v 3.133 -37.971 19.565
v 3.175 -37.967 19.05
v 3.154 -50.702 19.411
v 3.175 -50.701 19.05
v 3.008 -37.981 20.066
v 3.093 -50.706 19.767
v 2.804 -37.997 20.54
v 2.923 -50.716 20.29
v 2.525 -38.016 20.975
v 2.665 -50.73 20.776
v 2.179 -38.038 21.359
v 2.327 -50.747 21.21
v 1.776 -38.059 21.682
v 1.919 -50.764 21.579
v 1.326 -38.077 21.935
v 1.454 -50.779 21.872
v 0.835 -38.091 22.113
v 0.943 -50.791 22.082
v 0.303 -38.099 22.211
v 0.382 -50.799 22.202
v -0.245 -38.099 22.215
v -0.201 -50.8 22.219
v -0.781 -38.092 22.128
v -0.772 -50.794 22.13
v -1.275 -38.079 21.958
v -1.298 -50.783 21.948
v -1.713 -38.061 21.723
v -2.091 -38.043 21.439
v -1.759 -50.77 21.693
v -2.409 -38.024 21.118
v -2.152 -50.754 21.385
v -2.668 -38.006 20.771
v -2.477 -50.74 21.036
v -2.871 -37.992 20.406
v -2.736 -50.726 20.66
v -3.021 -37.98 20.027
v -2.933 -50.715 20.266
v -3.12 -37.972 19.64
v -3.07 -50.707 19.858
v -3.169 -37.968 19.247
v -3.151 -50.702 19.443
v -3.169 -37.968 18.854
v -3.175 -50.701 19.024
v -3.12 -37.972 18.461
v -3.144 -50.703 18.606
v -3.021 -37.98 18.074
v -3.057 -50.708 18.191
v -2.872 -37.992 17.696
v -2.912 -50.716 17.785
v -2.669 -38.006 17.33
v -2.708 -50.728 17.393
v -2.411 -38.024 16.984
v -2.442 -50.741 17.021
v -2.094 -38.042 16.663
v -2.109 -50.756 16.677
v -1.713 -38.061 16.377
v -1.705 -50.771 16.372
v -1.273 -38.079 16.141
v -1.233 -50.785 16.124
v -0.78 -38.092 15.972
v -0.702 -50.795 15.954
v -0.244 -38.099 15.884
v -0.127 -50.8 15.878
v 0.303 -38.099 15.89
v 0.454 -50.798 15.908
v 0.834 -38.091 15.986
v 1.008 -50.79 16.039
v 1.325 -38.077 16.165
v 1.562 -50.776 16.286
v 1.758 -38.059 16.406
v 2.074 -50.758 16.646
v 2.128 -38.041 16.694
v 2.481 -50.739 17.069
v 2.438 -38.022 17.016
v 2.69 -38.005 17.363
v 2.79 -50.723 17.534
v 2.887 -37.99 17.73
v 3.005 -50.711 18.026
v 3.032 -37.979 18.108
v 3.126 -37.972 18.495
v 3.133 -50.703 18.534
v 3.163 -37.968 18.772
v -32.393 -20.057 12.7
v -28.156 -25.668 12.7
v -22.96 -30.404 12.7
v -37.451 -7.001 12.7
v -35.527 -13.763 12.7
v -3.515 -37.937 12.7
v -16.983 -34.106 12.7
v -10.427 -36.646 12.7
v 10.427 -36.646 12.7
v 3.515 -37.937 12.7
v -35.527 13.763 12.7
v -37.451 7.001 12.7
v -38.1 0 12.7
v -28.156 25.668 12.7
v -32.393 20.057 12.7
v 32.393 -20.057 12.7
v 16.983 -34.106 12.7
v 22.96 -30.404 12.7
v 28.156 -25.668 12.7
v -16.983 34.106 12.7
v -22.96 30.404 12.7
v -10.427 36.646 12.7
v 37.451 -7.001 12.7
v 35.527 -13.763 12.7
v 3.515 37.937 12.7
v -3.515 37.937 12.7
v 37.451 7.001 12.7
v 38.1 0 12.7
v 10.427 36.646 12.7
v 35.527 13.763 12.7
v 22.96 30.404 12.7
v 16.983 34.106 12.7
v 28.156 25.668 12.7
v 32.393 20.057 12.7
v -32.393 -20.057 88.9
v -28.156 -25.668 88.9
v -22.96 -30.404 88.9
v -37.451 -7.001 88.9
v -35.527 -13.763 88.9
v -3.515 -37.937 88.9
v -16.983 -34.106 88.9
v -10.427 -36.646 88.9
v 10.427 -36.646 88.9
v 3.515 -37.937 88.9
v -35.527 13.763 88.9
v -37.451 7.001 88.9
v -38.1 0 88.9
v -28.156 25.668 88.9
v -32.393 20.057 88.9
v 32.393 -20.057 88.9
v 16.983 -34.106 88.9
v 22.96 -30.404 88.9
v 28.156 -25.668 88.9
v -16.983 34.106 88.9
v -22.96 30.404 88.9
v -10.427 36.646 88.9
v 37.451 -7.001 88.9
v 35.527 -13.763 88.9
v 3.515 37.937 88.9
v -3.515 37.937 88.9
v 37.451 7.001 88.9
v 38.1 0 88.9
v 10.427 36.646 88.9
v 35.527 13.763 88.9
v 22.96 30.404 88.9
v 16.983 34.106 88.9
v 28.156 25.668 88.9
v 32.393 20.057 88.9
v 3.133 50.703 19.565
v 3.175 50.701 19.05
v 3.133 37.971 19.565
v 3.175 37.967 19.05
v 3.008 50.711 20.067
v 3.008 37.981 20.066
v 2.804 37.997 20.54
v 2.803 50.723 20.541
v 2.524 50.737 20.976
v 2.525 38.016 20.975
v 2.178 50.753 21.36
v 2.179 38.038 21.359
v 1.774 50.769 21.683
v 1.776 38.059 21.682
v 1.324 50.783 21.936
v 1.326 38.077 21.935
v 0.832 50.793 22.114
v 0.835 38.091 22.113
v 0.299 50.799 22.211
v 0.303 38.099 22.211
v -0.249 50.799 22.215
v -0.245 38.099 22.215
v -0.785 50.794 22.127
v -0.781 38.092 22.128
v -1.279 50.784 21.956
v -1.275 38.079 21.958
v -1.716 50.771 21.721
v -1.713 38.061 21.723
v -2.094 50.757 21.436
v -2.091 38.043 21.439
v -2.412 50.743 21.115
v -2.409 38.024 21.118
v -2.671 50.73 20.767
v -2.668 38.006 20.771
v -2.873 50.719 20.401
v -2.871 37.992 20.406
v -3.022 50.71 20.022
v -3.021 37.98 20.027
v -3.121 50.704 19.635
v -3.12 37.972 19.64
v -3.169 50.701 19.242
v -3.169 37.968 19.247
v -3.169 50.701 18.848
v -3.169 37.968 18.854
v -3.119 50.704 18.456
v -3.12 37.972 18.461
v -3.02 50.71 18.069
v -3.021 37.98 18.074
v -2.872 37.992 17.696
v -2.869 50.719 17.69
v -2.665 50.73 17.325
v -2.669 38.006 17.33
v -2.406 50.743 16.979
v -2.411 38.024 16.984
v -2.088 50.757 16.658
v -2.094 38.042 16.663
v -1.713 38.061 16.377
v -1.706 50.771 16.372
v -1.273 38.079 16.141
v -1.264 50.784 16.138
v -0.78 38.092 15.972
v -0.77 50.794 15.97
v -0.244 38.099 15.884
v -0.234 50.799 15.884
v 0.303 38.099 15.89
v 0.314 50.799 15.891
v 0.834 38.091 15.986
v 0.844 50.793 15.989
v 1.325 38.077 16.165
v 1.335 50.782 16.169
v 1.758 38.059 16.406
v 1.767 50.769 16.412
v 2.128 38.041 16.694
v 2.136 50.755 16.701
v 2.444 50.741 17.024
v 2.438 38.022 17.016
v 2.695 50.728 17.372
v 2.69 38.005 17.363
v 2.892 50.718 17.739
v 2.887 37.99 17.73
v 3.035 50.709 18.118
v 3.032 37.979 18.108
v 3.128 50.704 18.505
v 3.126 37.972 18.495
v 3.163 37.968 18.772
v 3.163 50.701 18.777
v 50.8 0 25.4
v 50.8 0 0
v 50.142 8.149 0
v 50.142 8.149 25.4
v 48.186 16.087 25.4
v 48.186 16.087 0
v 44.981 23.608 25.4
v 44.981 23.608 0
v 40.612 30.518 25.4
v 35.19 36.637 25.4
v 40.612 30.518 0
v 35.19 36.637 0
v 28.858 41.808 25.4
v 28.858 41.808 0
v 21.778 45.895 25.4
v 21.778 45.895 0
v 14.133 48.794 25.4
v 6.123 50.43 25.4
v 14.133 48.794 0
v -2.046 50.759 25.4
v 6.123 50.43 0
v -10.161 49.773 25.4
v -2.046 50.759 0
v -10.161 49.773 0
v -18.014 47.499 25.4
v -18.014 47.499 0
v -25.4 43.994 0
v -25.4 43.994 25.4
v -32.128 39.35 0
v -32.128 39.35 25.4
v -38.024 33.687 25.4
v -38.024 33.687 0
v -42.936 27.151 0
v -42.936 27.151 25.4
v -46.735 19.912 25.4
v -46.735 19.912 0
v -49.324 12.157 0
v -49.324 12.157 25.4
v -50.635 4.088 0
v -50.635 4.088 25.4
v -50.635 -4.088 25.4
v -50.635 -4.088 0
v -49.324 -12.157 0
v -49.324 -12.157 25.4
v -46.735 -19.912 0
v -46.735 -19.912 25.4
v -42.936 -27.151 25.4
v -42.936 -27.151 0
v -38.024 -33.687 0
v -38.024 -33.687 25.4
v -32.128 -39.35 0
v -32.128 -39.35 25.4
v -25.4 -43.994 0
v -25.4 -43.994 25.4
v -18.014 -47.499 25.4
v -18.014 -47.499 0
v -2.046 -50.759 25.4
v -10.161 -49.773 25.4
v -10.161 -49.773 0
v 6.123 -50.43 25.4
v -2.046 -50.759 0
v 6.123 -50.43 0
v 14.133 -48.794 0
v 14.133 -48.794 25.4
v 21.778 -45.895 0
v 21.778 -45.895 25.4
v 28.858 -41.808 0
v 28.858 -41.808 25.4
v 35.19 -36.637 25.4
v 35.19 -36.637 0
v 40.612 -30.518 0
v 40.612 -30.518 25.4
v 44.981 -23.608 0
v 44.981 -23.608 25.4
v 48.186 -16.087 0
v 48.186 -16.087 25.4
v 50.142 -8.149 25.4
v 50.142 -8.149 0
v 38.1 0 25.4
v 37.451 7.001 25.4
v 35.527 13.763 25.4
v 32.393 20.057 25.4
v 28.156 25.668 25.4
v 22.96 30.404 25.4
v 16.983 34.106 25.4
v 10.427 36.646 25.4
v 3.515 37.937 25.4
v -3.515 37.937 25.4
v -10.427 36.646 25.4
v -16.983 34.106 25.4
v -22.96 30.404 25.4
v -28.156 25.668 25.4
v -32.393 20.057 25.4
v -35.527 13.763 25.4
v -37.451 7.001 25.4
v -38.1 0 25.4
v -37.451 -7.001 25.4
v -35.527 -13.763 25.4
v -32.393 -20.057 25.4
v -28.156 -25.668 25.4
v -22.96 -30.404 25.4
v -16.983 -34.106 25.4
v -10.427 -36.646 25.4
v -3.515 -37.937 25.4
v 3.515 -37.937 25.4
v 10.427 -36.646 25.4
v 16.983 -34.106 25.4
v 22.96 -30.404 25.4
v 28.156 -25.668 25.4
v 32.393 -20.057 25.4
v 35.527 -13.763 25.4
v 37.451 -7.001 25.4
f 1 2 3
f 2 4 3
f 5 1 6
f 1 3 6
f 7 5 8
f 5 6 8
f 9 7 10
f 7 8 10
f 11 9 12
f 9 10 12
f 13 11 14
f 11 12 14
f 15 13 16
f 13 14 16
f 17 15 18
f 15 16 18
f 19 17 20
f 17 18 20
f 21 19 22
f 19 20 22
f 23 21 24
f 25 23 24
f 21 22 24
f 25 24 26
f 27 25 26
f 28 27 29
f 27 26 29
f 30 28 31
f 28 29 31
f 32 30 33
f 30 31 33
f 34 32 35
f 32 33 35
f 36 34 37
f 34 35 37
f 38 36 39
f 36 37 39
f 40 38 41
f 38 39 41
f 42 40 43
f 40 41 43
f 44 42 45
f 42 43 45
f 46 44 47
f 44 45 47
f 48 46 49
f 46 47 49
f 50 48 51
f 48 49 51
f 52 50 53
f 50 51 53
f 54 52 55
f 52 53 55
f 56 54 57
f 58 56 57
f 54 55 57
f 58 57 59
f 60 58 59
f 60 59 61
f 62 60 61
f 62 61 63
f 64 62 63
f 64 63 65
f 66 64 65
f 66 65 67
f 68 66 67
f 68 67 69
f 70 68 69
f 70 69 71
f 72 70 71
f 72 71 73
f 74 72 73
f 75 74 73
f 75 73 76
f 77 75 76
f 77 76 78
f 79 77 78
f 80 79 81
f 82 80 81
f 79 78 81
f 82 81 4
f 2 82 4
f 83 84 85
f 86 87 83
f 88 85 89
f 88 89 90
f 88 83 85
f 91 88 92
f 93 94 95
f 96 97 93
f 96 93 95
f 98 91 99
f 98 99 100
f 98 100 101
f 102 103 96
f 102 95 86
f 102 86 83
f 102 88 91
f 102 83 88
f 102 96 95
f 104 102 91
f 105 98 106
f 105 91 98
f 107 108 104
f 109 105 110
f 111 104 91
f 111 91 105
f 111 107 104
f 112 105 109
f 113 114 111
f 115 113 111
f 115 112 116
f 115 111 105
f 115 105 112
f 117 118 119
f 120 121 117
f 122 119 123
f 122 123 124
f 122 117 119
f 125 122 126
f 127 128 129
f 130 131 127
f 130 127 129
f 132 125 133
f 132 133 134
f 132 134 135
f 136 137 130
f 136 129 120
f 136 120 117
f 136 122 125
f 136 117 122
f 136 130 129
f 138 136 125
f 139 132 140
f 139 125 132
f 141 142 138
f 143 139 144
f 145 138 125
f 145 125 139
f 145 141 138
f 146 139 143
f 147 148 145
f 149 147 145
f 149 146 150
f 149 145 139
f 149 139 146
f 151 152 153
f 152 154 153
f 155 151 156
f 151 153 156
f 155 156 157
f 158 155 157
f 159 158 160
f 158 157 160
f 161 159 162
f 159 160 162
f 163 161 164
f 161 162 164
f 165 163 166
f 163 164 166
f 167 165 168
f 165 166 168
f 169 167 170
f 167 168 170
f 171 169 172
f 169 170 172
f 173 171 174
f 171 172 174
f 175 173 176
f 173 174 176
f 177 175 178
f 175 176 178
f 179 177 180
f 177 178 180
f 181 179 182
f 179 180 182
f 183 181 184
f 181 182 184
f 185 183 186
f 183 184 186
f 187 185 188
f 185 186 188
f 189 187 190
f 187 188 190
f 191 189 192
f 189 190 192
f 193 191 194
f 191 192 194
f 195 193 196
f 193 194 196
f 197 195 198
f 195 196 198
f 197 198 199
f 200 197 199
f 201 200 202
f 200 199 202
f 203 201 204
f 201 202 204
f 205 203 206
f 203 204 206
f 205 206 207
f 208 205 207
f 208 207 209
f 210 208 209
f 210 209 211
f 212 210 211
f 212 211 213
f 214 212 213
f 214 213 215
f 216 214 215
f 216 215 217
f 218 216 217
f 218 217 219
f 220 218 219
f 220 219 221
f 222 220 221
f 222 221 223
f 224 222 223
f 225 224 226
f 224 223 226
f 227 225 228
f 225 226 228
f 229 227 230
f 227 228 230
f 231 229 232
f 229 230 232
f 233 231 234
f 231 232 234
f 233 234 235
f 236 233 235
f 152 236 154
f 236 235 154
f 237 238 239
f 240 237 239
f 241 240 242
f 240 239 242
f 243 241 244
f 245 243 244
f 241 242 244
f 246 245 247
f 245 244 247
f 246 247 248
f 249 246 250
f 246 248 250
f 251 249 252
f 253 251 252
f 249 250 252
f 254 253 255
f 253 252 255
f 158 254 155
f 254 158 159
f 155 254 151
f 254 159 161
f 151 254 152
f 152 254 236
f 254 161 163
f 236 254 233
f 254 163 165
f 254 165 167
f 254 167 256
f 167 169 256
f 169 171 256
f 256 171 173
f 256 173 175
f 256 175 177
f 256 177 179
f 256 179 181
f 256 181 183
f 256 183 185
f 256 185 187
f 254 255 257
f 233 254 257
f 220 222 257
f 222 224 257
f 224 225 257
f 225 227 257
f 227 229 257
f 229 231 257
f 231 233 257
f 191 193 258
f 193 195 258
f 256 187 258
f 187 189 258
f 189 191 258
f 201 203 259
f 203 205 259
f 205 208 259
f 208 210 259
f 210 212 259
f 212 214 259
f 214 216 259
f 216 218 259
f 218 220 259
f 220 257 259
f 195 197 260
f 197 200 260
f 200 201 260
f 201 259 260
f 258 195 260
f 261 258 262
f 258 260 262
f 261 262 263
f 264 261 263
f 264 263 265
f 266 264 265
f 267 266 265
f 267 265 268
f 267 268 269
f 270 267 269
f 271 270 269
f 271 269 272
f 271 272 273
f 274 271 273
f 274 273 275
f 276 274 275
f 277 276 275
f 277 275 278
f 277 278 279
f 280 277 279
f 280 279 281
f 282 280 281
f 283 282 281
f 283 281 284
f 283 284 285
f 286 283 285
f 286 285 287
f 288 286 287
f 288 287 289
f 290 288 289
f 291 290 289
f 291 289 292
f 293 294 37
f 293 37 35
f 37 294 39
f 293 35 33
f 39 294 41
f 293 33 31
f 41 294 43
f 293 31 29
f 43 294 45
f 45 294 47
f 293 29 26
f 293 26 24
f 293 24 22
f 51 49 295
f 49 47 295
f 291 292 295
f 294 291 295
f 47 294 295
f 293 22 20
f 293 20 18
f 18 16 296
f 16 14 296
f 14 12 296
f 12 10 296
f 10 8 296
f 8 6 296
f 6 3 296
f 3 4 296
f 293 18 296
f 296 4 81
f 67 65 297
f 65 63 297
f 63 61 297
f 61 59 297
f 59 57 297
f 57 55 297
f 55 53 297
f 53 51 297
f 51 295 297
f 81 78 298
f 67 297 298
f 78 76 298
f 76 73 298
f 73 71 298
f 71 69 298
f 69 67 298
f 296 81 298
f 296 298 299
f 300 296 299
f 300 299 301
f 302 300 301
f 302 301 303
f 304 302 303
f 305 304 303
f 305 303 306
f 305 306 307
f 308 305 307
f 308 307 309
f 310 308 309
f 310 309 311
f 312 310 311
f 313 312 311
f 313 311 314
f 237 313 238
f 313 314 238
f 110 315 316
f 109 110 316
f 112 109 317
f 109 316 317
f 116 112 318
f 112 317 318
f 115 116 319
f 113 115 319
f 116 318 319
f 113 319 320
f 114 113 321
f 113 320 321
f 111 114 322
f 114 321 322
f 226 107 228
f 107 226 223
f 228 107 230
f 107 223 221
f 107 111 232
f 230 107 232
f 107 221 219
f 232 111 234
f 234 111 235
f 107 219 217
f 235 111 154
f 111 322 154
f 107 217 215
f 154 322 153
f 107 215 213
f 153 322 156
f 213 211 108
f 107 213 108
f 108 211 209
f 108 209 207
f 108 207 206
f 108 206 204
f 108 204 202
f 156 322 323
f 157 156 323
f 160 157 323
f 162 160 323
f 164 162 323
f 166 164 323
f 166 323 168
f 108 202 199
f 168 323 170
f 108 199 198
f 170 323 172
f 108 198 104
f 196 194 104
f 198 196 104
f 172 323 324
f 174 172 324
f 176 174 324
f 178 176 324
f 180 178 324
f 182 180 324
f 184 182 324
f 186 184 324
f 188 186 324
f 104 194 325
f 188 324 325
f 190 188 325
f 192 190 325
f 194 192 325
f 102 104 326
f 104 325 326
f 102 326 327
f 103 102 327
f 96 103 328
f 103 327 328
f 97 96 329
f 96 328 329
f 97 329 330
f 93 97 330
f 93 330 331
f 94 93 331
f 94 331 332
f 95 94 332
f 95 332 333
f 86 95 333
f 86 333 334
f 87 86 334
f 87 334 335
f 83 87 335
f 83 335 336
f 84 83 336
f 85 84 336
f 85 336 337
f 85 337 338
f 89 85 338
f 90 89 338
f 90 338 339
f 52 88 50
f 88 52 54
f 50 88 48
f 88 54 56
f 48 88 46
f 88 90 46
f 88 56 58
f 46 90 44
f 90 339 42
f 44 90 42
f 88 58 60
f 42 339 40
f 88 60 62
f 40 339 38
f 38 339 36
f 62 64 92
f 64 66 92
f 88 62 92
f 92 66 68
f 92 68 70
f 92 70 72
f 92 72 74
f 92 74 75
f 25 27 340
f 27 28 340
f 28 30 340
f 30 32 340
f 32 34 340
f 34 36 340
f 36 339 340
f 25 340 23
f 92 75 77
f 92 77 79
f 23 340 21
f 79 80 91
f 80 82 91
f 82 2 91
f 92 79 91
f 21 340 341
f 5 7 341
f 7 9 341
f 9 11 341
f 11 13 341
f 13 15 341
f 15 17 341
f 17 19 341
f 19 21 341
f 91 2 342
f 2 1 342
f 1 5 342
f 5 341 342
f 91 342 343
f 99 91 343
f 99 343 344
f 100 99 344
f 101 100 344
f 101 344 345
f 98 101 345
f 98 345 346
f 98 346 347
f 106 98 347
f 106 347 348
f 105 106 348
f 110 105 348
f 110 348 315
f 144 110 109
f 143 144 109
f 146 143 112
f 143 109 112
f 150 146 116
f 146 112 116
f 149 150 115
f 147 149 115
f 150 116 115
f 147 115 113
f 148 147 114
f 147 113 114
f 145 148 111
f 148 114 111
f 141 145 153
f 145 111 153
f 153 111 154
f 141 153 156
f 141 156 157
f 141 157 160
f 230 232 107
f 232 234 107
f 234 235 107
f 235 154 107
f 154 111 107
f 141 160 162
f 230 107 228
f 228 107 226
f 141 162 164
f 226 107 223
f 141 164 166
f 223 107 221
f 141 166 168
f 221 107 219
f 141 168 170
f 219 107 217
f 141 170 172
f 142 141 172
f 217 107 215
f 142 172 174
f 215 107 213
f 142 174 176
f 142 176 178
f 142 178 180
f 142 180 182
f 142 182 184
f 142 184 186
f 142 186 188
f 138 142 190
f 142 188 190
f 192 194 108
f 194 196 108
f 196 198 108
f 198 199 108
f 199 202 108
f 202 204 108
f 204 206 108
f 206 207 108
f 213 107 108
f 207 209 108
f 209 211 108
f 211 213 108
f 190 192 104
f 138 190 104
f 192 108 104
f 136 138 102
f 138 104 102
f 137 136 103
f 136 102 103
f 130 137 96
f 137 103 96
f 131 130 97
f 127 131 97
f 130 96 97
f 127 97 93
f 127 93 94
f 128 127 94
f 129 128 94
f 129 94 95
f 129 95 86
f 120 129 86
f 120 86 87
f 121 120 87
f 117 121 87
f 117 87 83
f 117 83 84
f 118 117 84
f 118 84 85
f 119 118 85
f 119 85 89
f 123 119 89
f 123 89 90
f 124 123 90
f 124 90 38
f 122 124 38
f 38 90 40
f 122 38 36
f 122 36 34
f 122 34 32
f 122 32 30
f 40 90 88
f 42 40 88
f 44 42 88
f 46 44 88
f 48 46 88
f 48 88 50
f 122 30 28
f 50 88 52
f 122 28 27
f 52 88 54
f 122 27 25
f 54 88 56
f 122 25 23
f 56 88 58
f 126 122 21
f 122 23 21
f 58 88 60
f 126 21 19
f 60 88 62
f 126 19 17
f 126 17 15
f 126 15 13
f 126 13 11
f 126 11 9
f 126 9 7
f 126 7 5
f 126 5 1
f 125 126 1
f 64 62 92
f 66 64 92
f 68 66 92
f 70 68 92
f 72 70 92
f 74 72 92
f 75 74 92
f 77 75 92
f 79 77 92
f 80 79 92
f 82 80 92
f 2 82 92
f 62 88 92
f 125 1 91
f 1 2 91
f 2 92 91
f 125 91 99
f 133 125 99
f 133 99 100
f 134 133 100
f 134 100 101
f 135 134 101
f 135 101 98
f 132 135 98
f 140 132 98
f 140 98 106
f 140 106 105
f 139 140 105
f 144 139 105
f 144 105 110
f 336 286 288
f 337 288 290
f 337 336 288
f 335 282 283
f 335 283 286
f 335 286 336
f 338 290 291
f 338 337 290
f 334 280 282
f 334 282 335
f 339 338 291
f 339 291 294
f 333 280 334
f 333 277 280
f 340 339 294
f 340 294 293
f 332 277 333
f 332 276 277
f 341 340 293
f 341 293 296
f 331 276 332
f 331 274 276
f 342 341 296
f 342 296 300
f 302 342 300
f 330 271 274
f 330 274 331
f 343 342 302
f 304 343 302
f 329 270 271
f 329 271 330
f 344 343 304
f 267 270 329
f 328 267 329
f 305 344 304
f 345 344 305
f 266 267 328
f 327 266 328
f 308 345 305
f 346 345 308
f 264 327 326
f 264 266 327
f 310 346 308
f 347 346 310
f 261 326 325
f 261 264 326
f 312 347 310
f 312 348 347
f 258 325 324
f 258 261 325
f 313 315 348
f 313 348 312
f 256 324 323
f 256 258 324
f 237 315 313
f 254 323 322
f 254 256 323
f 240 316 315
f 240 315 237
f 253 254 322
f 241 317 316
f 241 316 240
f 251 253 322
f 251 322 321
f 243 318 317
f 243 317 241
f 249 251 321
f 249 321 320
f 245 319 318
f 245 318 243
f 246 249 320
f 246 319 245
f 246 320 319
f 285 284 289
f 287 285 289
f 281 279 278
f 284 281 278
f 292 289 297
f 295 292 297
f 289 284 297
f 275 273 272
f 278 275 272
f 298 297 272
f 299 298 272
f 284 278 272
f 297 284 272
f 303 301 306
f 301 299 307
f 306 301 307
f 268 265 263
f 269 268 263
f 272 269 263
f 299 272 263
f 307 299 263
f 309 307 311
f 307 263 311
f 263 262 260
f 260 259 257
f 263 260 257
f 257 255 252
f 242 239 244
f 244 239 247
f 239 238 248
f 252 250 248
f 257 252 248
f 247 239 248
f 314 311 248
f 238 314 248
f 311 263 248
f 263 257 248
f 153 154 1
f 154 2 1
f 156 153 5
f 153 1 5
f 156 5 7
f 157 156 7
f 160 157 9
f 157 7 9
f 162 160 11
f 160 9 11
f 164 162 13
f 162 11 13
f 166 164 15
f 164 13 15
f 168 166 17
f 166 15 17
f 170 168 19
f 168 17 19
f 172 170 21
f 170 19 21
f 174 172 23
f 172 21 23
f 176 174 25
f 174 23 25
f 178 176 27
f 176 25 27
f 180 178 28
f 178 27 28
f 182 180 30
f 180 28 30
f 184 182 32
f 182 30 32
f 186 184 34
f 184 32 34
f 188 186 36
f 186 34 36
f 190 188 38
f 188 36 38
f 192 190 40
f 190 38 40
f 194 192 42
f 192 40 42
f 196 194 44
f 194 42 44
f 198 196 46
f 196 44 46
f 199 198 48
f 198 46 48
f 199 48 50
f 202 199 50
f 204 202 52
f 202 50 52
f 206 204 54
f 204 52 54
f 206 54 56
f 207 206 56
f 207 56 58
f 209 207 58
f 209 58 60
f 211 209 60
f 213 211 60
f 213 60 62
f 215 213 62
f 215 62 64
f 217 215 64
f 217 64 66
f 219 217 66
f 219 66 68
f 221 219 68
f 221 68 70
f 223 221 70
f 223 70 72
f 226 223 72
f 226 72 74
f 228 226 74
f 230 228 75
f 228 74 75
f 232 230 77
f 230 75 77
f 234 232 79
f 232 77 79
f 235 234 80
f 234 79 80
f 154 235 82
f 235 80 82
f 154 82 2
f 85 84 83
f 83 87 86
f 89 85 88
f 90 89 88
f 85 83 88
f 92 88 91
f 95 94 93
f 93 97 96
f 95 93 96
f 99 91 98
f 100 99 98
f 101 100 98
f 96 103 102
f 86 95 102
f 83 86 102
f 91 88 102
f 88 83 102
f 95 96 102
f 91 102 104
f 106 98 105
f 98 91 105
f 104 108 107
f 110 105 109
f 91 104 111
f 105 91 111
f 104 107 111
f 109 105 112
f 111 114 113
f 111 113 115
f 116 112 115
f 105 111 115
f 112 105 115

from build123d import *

# Parameters (mm, degrees)
F0_R     = 50.8
F1_DEPTH = 25.4
F2_R     = 38.1
F3_DEPTH = 12.7
F5_R     = 38.1
F6_DEPTH = 76.2
F4_R     = 3.175
F7_DEPTH = 50.8


with BuildPart() as f1:
    # F0 (on Top) → F1 (new body)
    with BuildSketch(Plane.XY):
        Circle(F0_R)
    extrude(amount=F1_DEPTH)

    # F2 (on face) → F3 (cut)
    with BuildSketch(Plane.XY.offset(25.4)):
        Circle(F2_R)
    extrude(amount=-F3_DEPTH, mode=Mode.SUBTRACT)


with BuildPart() as f6:
    # F5 (on face) → F6 (new body)
    with BuildSketch(Plane.XY.offset(12.7)):
        Circle(F5_R)
    extrude(amount=F6_DEPTH)


with BuildPart() as f7_tool:
    # F4 (on Front) → F7 (new body, symmetric)
    with BuildSketch(Plane.XZ):
        with Locations((0, 19.05)):
            Circle(F4_R)
    extrude(amount=F7_DEPTH, both=True)


with BuildPart() as f1_1:
    add(f1.part)

    # F7: cut by f7_tool
    add(f7_tool.part, mode=Mode.SUBTRACT)


with BuildPart() as f6_1:
    add(f6.part)

    # F7: cut by f7_tool
    add(f7_tool.part, mode=Mode.SUBTRACT)


solid = Compound([f1_1.part, f6_1.part])
